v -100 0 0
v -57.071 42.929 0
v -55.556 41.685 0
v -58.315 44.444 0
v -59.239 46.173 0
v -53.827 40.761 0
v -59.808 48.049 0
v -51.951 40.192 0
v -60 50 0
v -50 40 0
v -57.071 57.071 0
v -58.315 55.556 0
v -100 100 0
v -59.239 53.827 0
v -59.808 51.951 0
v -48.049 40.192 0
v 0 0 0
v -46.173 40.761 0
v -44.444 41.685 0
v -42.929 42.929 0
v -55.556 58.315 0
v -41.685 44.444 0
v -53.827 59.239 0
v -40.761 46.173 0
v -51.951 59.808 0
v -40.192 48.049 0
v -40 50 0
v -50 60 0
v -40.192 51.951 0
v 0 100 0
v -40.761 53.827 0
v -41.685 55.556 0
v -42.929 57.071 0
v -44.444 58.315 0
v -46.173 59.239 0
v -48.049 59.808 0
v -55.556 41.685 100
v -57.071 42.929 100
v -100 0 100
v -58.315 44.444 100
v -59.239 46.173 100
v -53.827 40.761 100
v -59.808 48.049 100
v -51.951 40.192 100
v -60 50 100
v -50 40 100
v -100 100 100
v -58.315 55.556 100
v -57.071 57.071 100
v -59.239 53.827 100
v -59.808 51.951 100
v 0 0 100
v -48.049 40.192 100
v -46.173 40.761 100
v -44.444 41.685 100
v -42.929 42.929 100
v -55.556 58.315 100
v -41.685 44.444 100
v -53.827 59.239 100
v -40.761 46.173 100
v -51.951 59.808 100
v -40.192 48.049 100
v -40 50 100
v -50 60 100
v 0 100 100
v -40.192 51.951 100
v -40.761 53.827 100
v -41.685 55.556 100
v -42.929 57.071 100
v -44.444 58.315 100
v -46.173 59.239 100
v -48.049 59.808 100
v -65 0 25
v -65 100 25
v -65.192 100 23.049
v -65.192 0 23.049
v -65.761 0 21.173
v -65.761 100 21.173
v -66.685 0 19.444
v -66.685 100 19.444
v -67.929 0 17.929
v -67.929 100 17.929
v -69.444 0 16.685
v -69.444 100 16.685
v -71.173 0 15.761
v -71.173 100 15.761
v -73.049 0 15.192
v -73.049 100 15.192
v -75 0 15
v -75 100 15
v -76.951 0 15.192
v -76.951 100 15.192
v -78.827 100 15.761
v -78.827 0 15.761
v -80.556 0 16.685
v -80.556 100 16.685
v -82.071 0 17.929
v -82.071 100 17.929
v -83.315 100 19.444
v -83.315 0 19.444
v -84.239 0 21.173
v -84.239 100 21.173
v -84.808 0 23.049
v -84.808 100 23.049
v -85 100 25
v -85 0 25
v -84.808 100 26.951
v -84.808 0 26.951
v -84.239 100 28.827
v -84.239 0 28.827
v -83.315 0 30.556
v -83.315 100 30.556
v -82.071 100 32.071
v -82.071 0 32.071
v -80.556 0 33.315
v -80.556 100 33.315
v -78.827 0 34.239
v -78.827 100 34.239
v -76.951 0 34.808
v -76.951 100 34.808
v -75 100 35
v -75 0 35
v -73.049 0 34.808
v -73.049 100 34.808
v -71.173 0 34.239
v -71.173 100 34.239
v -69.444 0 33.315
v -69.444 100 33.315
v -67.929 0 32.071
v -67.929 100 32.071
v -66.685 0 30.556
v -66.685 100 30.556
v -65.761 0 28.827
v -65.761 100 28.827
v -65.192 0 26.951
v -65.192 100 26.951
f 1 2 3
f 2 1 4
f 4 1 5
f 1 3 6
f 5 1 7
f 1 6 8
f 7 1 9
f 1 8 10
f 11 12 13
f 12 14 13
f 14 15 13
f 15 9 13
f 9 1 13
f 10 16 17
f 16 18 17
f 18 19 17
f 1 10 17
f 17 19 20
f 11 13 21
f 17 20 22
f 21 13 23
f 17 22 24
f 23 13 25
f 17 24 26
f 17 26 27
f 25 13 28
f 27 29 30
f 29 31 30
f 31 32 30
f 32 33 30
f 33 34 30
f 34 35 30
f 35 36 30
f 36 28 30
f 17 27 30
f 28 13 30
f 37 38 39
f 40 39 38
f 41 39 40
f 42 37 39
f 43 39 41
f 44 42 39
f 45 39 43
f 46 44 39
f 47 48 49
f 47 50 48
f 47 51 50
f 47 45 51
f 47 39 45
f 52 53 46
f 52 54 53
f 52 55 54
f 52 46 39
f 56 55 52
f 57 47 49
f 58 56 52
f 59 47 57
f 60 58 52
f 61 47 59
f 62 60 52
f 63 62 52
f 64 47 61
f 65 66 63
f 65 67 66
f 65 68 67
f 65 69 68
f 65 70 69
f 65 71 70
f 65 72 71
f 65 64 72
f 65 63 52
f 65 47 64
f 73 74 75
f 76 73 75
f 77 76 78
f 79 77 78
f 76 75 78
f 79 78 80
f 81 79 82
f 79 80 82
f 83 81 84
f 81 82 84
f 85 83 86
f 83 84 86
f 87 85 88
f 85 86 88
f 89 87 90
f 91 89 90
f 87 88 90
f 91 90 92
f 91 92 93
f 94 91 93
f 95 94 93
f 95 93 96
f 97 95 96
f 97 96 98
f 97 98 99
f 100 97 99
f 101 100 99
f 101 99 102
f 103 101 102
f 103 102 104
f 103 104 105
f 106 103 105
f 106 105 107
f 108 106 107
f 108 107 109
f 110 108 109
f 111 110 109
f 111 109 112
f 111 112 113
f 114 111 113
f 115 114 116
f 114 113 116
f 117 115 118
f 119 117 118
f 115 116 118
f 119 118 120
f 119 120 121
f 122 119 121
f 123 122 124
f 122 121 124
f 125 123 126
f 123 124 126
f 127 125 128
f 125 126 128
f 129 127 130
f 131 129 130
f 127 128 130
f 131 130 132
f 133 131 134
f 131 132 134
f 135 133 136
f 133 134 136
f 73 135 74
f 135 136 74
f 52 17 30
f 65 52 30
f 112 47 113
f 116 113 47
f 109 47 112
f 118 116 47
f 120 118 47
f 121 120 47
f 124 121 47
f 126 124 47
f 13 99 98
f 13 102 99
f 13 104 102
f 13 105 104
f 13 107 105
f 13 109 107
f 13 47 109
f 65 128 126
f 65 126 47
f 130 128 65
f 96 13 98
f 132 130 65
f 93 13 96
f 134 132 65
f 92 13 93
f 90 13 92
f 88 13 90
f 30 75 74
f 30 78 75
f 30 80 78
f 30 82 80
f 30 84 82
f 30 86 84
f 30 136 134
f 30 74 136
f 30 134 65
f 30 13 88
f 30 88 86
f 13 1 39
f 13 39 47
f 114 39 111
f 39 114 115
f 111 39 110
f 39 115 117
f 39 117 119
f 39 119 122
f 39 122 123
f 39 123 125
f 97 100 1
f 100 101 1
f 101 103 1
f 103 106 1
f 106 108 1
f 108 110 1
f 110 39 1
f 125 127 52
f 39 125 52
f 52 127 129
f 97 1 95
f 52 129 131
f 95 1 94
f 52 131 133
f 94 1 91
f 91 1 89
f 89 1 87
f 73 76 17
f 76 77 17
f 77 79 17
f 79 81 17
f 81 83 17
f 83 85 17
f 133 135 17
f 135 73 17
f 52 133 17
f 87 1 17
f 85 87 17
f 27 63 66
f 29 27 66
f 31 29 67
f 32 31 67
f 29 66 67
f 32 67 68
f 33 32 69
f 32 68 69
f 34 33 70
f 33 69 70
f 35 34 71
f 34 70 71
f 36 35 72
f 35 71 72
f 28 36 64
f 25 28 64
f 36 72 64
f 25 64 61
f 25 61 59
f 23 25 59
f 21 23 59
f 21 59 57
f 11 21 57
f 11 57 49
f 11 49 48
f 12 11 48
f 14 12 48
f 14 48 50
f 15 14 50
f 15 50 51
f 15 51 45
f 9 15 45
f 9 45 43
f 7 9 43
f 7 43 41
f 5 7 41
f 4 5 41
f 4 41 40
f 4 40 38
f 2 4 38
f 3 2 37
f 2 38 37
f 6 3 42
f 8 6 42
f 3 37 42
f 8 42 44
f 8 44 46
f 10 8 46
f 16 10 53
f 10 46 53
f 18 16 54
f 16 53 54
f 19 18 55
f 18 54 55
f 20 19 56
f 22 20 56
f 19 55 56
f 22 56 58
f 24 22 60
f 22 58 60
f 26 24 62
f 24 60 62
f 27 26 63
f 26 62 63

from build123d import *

# Parameters (mm, degrees)
ESQUISSE2_W             = 100
ESQUISSE2_H             = 100
BOSS_EXTRU_1_DEPTH      = 100
ESQUISSE3_R             = 10
ENL_V_MAT_EXTRU_1_DEPTH = 101
ESQUISSE4_R             = 10
ENL_V_MAT_EXTRU_2_DEPTH = 101


with BuildPart() as part:
    # Esquisse2 → Boss.-Extru.1 (new body)
    with BuildSketch(Plane.XY):
        with Locations((-50, 50)):
            Rectangle(ESQUISSE2_W, ESQUISSE2_H)
    extrude(amount=BOSS_EXTRU_1_DEPTH)

    # Esquisse3 → Enlèv. mat.-Extru.1 (cut, through all)
    with BuildSketch(Plane.XY.offset(100)):
        with Locations((-50, 50)):
            Circle(ESQUISSE3_R)
    extrude(amount=-ENL_V_MAT_EXTRU_1_DEPTH, mode=Mode.SUBTRACT)

    # Esquisse4 → Enlèv. mat.-Extru.2 (cut, through all)
    with BuildSketch(Plane(origin=(0, 100, 0), x_dir=(1, 0, 0), z_dir=(0, 1, 0))):
        with Locations((-75, -25)):
            Circle(ESQUISSE4_R)
    extrude(amount=-ENL_V_MAT_EXTRU_2_DEPTH, mode=Mode.SUBTRACT)


solid = part.part
